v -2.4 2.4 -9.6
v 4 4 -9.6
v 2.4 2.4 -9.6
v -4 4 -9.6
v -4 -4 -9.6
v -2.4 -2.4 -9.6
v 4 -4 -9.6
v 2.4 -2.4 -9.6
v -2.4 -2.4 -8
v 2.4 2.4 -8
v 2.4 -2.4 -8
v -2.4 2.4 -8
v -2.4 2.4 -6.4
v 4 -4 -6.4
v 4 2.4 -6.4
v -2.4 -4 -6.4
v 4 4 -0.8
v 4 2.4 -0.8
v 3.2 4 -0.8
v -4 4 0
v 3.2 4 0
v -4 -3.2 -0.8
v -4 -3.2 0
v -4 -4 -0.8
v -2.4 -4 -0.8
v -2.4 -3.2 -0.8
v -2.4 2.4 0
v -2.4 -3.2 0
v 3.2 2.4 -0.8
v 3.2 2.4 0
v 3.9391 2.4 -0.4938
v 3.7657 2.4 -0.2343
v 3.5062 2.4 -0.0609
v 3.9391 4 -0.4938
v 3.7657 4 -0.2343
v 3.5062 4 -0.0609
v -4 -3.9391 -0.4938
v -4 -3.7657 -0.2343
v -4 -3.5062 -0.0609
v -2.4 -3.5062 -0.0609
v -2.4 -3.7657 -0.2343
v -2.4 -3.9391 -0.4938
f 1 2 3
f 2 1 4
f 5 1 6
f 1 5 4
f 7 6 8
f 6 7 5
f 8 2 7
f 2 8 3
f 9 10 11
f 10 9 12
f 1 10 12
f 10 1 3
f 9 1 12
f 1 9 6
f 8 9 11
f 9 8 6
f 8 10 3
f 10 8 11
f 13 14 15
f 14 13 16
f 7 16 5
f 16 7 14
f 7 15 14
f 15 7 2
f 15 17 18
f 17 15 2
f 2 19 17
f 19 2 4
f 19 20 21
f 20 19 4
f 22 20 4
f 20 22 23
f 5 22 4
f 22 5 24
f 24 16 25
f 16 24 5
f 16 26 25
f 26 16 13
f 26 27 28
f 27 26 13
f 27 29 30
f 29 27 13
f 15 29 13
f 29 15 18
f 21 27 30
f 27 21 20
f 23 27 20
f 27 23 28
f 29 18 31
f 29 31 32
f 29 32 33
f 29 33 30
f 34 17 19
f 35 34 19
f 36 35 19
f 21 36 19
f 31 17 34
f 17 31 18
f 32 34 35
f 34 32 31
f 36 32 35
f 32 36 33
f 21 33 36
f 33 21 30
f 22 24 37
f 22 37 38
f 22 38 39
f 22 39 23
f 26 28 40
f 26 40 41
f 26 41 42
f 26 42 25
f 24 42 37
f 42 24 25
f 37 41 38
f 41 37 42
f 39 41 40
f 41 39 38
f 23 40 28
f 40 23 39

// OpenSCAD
// file: ../p/1-4edge.scad
use <../lib.scad>
function ldraw_lib__1_4edge() = [
// 0 Circle 0.25
// 0 Name: 1-4edge.dat
// 0 Author: James Jessiman
// 0 !LDRAW_ORG Primitive UPDATE 2017-01
// 0 !LICENSE Licensed under CC BY 4.0 : see CAreadme.txt
// 
// 0 BFC CERTIFY CCW
  [0,"BFC","CERTIFY"],
  [0,"BFC","CCW"],
// 
// 0 !HISTORY 2007-06-22 [PTadmin] Header formatted for Contributor Agreement
// 0 !HISTORY 2008-07-01 [PTadmin] Official Update 2008-01
// 0 !HISTORY 2017-01-15 [Steffen] BFCed
// 0 !HISTORY 2017-12-30 [PTadmin] Official Update 2017-01
// 
// 
// 2 24 1 0 0 0.9239 0 0.3827
  [2,24,1,0,0,0.9239,0,0.3827],
// 2 24 0.9239 0 0.3827 0.7071 0 0.7071
  [2,24,0.9239,0,0.3827,0.7071,0,0.7071],
// 2 24 0.7071 0 0.7071 0.3827 0 0.9239
  [2,24,0.7071,0,0.7071,0.3827,0,0.9239],
// 2 24 0.3827 0 0.9239 0 0 1
  [2,24,0.3827,0,0.9239,0,0,1],
];
module ldraw_lib__1_4edge(step=0, col=false, unit=2/5, alt=false, line=0.2, solid=!$preview)
    makepoly(ldraw_lib__1_4edge(), step=step, col=col, unit=unit, alt=alt, line=line, solid=solid);
ldraw_lib__1_4edge(line=0.2);
// file: ../p/1-4cyli.scad
use <../lib.scad>
function ldraw_lib__1_4cyli() = [
// 0 Cylinder 0.25
// 0 Name: 1-4cyli.dat
// 0 Author: James Jessiman
// 0 !LDRAW_ORG Primitive UPDATE 2012-01
// 0 !LICENSE Licensed under CC BY 4.0 : see CAreadme.txt
// 
// 0 BFC CERTIFY CCW
  [0,"BFC","CERTIFY"],
  [0,"BFC","CCW"],
// 
// 0 !HISTORY 2002-03-23 [sbliss] Added BFC statement.
// 0 !HISTORY 2002-04-25 [PTadmin] Official Update 2002-02
// 0 !HISTORY 2007-06-22 [PTadmin] Header formatted for Contributor Agreement
// 0 !HISTORY 2008-07-01 [PTadmin] Official Update 2008-01
// 0 !HISTORY 2012-02-16 [Philo] Changed to CCW
// 0 !HISTORY 2012-03-30 [PTadmin] Official Update 2012-01
// 
// 
// 4 16 1 1 0 0.9239 1 0.3827 0.9239 0 0.3827 1 0 0
  [4,16,1,1,0,0.9239,1,0.3827,0.9239,0,0.3827,1,0,0],
// 5 24 1 0 0 1 1 0 0.9239 0 0.3827 1 0 -1
  [5,24,1,0,0,1,1,0,0.9239,0,0.3827,1,0,-1],
// 4 16 0.9239 1 0.3827 0.7071 1 0.7071 0.7071 0 0.7071 0.9239 0 0.3827
  [4,16,0.9239,1,0.3827,0.7071,1,0.7071,0.7071,0,0.7071,0.9239,0,0.3827],
// 5 24 0.9239 0 0.3827 0.9239 1 0.3827 0.7071 0 0.7071 1 0 0
  [5,24,0.9239,0,0.3827,0.9239,1,0.3827,0.7071,0,0.7071,1,0,0],
// 4 16 0.7071 1 0.7071 0.3827 1 0.9239 0.3827 0 0.9239 0.7071 0 0.7071
  [4,16,0.7071,1,0.7071,0.3827,1,0.9239,0.3827,0,0.9239,0.7071,0,0.7071],
// 5 24 0.7071 0 0.7071 0.7071 1 0.7071 0.3827 0 0.9239 0.9239 0 0.3827
  [5,24,0.7071,0,0.7071,0.7071,1,0.7071,0.3827,0,0.9239,0.9239,0,0.3827],
// 4 16 0.3827 1 0.9239 0 1 1 0 0 1 0.3827 0 0.9239
  [4,16,0.3827,1,0.9239,0,1,1,0,0,1,0.3827,0,0.9239],
// 5 24 0.3827 0 0.9239 0.3827 1 0.9239 0 0 1 0.7071 0 0.7071
  [5,24,0.3827,0,0.9239,0.3827,1,0.9239,0,0,1,0.7071,0,0.7071],
// 5 24 0 0 1 0 1 1 0.3827 0 0.9239 -1 0 1
  [5,24,0,0,1,0,1,1,0.3827,0,0.9239,-1,0,1],
];
module ldraw_lib__1_4cyli(step=0, col=false, unit=2/5, alt=false, line=0.2, solid=!$preview)
    makepoly(ldraw_lib__1_4cyli(), step=step, col=col, unit=unit, alt=alt, line=line, solid=solid);
ldraw_lib__1_4cyli(line=0.2);
// file: ../p/box5.scad
use <../lib.scad>
function ldraw_lib__box5() = [
// 0 Box with 5 Faces and All Edges
// 0 Name: box5.dat
// 0 Author: James Jessiman
// 0 !LDRAW_ORG Primitive UPDATE 2012-01
// 0 !LICENSE Licensed under CC BY 4.0 : see CAreadme.txt
// 
// 0 BFC CERTIFY CCW
  [0,"BFC","CERTIFY"],
  [0,"BFC","CCW"],
// 
// 0 !HISTORY 2002-04-03 [sbliss] Modified for BFC compliance
// 0 !HISTORY 2002-04-25 [PTadmin] Official Update 2002-02
// 0 !HISTORY 2007-06-24 [PTadmin] Header formatted for Contributor Agreement
// 0 !HISTORY 2008-07-01 [PTadmin] Official Update 2008-01
// 0 !HISTORY 2012-02-16 [Philo] Changed to CCW
// 0 !HISTORY 2012-03-30 [PTadmin] Official Update 2012-01
// 
// 
// 2 24 1 1 1 -1 1 1
  [2,24,1,1,1,-1,1,1],
// 2 24 -1 1 1 -1 1 -1
  [2,24,-1,1,1,-1,1,-1],
// 2 24 -1 1 -1 1 1 -1
  [2,24,-1,1,-1,1,1,-1],
// 2 24 1 1 -1 1 1 1
  [2,24,1,1,-1,1,1,1],
// 2 24 1 0 1 -1 0 1
  [2,24,1,0,1,-1,0,1],
// 2 24 -1 0 1 -1 0 -1
  [2,24,-1,0,1,-1,0,-1],
// 2 24 -1 0 -1 1 0 -1
  [2,24,-1,0,-1,1,0,-1],
// 2 24 1 0 -1 1 0 1
  [2,24,1,0,-1,1,0,1],
// 2 24 1 0 1 1 1 1
  [2,24,1,0,1,1,1,1],
// 2 24 -1 0 1 -1 1 1
  [2,24,-1,0,1,-1,1,1],
// 2 24 1 0 -1 1 1 -1
  [2,24,1,0,-1,1,1,-1],
// 2 24 -1 0 -1 -1 1 -1
  [2,24,-1,0,-1,-1,1,-1],
// 4 16 -1 1 1 1 1 1 1 1 -1 -1 1 -1
  [4,16,-1,1,1,1,1,1,1,1,-1,-1,1,-1],
// 4 16 -1 1 1 -1 0 1 1 0 1 1 1 1
  [4,16,-1,1,1,-1,0,1,1,0,1,1,1,1],
// 4 16 -1 1 -1 -1 0 -1 -1 0 1 -1 1 1
  [4,16,-1,1,-1,-1,0,-1,-1,0,1,-1,1,1],
// 4 16 1 1 -1 1 0 -1 -1 0 -1 -1 1 -1
  [4,16,1,1,-1,1,0,-1,-1,0,-1,-1,1,-1],
// 4 16 1 1 1 1 0 1 1 0 -1 1 1 -1
  [4,16,1,1,1,1,0,1,1,0,-1,1,1,-1],
];
module ldraw_lib__box5(step=0, col=false, unit=2/5, alt=false, line=0.2, solid=!$preview)
    makepoly(ldraw_lib__box5(), step=step, col=col, unit=unit, alt=alt, line=line, solid=solid);
ldraw_lib__box5(line=0.2);
// file: ../p/1-4disc.scad
use <../lib.scad>
function ldraw_lib__1_4disc() = [
// 0 Disc 0.25
// 0 Name: 1-4disc.dat
// 0 Author: James Jessiman
// 0 !LDRAW_ORG Primitive UPDATE 2002-02
// 0 !LICENSE Licensed under CC BY 4.0 : see CAreadme.txt
// 
// 0 BFC CERTIFY CCW
  [0,"BFC","CERTIFY"],
  [0,"BFC","CCW"],
// 
// 0 !HISTORY 2002-03-23 [sbliss] Added BFC statement.
// 0 !HISTORY 2002-04-25 [PTadmin] Official Update 2002-02
// 0 !HISTORY 2007-06-22 [PTadmin] Header formatted for Contributor Agreement
// 0 !HISTORY 2008-07-01 [PTadmin] Official Update 2008-01
// 
// 
// 3 16 0 0 0 1 0 0 0.9239 0 0.3827
  [3,16,0,0,0,1,0,0,0.9239,0,0.3827],
// 3 16 0 0 0 0.9239 0 0.3827 0.7071 0 0.7071
  [3,16,0,0,0,0.9239,0,0.3827,0.7071,0,0.7071],
// 3 16 0 0 0 0.7071 0 0.7071 0.3827 0 0.9239
  [3,16,0,0,0,0.7071,0,0.7071,0.3827,0,0.9239],
// 3 16 0 0 0 0.3827 0 0.9239 0 0 1
  [3,16,0,0,0,0.3827,0,0.9239,0,0,1],
// 0
];
module ldraw_lib__1_4disc(step=0, col=false, unit=2/5, alt=false, line=0.2, solid=!$preview)
    makepoly(ldraw_lib__1_4disc(), step=step, col=col, unit=unit, alt=alt, line=line, solid=solid);
ldraw_lib__1_4disc(line=0.2);
// file: ../p/1-4cylo.scad
use <../lib.scad>
use <1-4cyli.scad>
use <1-4edge.scad>
function ldraw_lib__1_4cylo() = [
// 0 Cylinder Open 0.25
// 0 Name: 1-4cylo.dat
// 0 Author: Max Martin Richter [MMR1988]
// 0 !LDRAW_ORG Primitive UPDATE 2010-03
// 0 !LICENSE Licensed under CC BY 4.0 : see CAreadme.txt
// 
// 0 BFC CERTIFY CCW
  [0,"BFC","CERTIFY"],
  [0,"BFC","CCW"],
// 
// 0 !HISTORY 2010-12-31 [PTadmin] Official Update 2010-03
// 
// 
// 1 16 0 0 0 1 0 0 0 1 0 0 0 1 1-4edge.dat
  [1,16,0,0,0,1,0,0,0,1,0,0,0,1, ldraw_lib__1_4edge()],
// 1 16 0 1 0 1 0 0 0 1 0 0 0 1 1-4edge.dat
  [1,16,0,1,0,1,0,0,0,1,0,0,0,1, ldraw_lib__1_4edge()],
// 1 16 0 0 0 1 0 0 0 1 0 0 0 1 1-4cyli.dat
  [1,16,0,0,0,1,0,0,0,1,0,0,0,1, ldraw_lib__1_4cyli()],
];
module ldraw_lib__1_4cylo(step=0, col=false, unit=2/5, alt=false, line=0.2, solid=!$preview)
    makepoly(ldraw_lib__1_4cylo(), step=step, col=col, unit=unit, alt=alt, line=line, solid=solid);
ldraw_lib__1_4cylo(line=0.2);
// main file
use <../lib.scad>
use <../p/1-4cylo.scad>
use <../p/1-4disc.scad>
use <../p/box5.scad>
function ldraw_lib__6231() = [
// 0 Panel  1 x  1 x  1 Corner with Rounded Corners
// 0 Name: 6231.dat
// 0 Author: James Jessiman
// 0 !LDRAW_ORG Part UPDATE 2025-09
// 0 !LICENSE Licensed under CC BY 4.0 : see CAreadme.txt
// 
// 0 BFC CERTIFY CCW
  [0,"BFC","CERTIFY"],
  [0,"BFC","CCW"],
// 
// 0 !HISTORY 2001-10-12 [sparre] bug-fix
// 0 !HISTORY 2001-11-30 [PTadmin] Official Update 2001-02
// 0 !HISTORY 2007-10-26 [PTadmin] Header formatted for Contributor Agreement
// 0 !HISTORY 2008-07-01 [PTadmin] Official Update 2008-01
// 0 !HISTORY 2008-07-07 [mikeheide] BFC'd (2007-08-24)
// 0 !HISTORY 2009-09-03 [PTadmin] Official Update 2009-02
// 0 !HISTORY 2011-01-24 [Rolf] Added rounded corners
// 0 !HISTORY 2011-12-29 [PTadmin] Official Update 2011-02
// 0 !HISTORY 2025-09-27 [OrionP] Changed winding to CCW
// 0 !HISTORY 2025-09-29 [OrionP] Official Update 2025-09
// 
// 2 24 10 24 10 -10 24 10
  [2,24,10,24,10,-10,24,10],
// 2 24 -10 24 10 -10 24 -10
  [2,24,-10,24,10,-10,24,-10],
// 2 24 -10 24 -10 10 24 -10
  [2,24,-10,24,-10,10,24,-10],
// 2 24 10 24 -10 10 24 10
  [2,24,10,24,-10,10,24,10],
// 2 24 10 16 6 -6 16 6
  [2,24,10,16,6,-6,16,6],
// 2 24 -6 16 6 -6 16 -10
  [2,24,-6,16,6,-6,16,-10],
// 2 24 -6 16 -10 10 16 -10
  [2,24,-6,16,-10,10,16,-10],
// 2 24 10 16 -10 10 16 6
  [2,24,10,16,-10,10,16,6],
// 2 24 8 0 10 -10 0 10
  [2,24,8,0,10,-10,0,10],
// 2 24 -10 0 10 -10 0 -8
  [2,24,-10,0,10,-10,0,-8],
// 2 24 -6 0 -8 -6 0 6
  [2,24,-6,0,-8,-6,0,6],
// 2 24 -6 0 6 8 0 6
  [2,24,-6,0,6,8,0,6],
// 2 24 10 2 6 10 16 6
  [2,24,10,2,6,10,16,6],
// 2 24 -6 0 6 -6 16 6
  [2,24,-6,0,6,-6,16,6],
// 2 24 -6 2 -10 -6 16 -10
  [2,24,-6,2,-10,-6,16,-10],
// 2 24 10 16 -10 10 24 -10
  [2,24,10,16,-10,10,24,-10],
// 2 24 10 2 10 10 24 10
  [2,24,10,2,10,10,24,10],
// 2 24 -10 0 10 -10 24 10
  [2,24,-10,0,10,-10,24,10],
// 2 24 -10 2 -10 -10 24 -10
  [2,24,-10,2,-10,-10,24,-10],
// 
// 4 16 10 24 10 6 24 6 -6 24 6 -10 24 10
  [4,16,10,24,10,6,24,6,-6,24,6,-10,24,10],
// 4 16 -10 24 10 -6 24 6 -6 24 -6 -10 24 -10
  [4,16,-10,24,10,-6,24,6,-6,24,-6,-10,24,-10],
// 4 16 -10 24 -10 -6 24 -6 6 24 -6 10 24 -10
  [4,16,-10,24,-10,-6,24,-6,6,24,-6,10,24,-10],
// 4 16 10 24 -10 6 24 -6 6 24 6 10 24 10
  [4,16,10,24,-10,6,24,-6,6,24,6,10,24,10],
// 0 BFC INVERTNEXT
  [0,"BFC","INVERTNEXT"],
// 1 16 0 24 0 6 0 0 0 -4 0 0 0 6 box5.dat
  [1,16,0,24,0,6,0,0,0,-4,0,0,0,6, ldraw_lib__box5()],
// 4 16 -6 16 6 -6 16 -10 10 16 -10 10 16 6
  [4,16,-6,16,6,-6,16,-10,10,16,-10,10,16,6],
// 4 16 -10 24 -10 10 24 -10 10 16 -10 -6 16 -10
  [4,16,-10,24,-10,10,24,-10,10,16,-10,-6,16,-10],
// 4 16 10 24 -10 10 24 10 10 16 6 10 16 -10
  [4,16,10,24,-10,10,24,10,10,16,6,10,16,-10],
// 4 16 10 2 6 10 16 6 10 24 10 10 2 10
  [4,16,10,2,6,10,16,6,10,24,10,10,2,10],
// 4 16 -10 24 10 8 2 10 10 2 10 10 24 10
  [4,16,-10,24,10,8,2,10,10,2,10,10,24,10],
// 4 16 -10 24 10 -10 0 10 8 0 10 8 2 10
  [4,16,-10,24,10,-10,0,10,8,0,10,8,2,10],
// 4 16 -10 2 -8 -10 0 -8 -10 0 10 -10 24 10
  [4,16,-10,2,-8,-10,0,-8,-10,0,10,-10,24,10],
// 4 16 -10 24 -10 -10 2 -10 -10 2 -8 -10 24 10
  [4,16,-10,24,-10,-10,2,-10,-10,2,-8,-10,24,10],
// 4 16 -6 16 -10 -6 2 -10 -10 2 -10 -10 24 -10
  [4,16,-6,16,-10,-6,2,-10,-10,2,-10,-10,24,-10],
// 4 16 -6 16 6 -6 2 -8 -6 2 -10 -6 16 -10
  [4,16,-6,16,6,-6,2,-8,-6,2,-10,-6,16,-10],
// 4 16 -6 16 6 -6 0 6 -6 0 -8 -6 2 -8
  [4,16,-6,16,6,-6,0,6,-6,0,-8,-6,2,-8],
// 4 16 8 2 6 8 0 6 -6 0 6 -6 16 6
  [4,16,8,2,6,8,0,6,-6,0,6,-6,16,6],
// 4 16 10 16 6 10 2 6 8 2 6 -6 16 6
  [4,16,10,16,6,10,2,6,8,2,6,-6,16,6],
// 4 16 -10 0 10 -6 0 6 8 0 6 8 0 10
  [4,16,-10,0,10,-6,0,6,8,0,6,8,0,10],
// 4 16 -10 0 10 -10 0 -8 -6 0 -8 -6 0 6
  [4,16,-10,0,10,-10,0,-8,-6,0,-8,-6,0,6],
// 
// 1 16 8 2 6 2 0 0 0 0 -2 0 2 0 1-4disc.dat
  [1,16,8,2,6,2,0,0,0,0,-2,0,2,0, ldraw_lib__1_4disc()],
// 1 16 8 2 10 2 0 0 0 0 -2 0 -2 0 1-4disc.dat
  [1,16,8,2,10,2,0,0,0,0,-2,0,-2,0, ldraw_lib__1_4disc()],
// 1 16 8 2 6 2 0 0 0 0 -2 0 4 0 1-4cylo.dat
  [1,16,8,2,6,2,0,0,0,0,-2,0,4,0, ldraw_lib__1_4cylo()],
// 1 16 -10 2 -8 0 2 0 0 0 -2 -2 0 0 1-4disc.dat
  [1,16,-10,2,-8,0,2,0,0,0,-2,-2,0,0, ldraw_lib__1_4disc()],
// 1 16 -6 2 -8 0 -2 0 -2 0 0 0 0 -2 1-4disc.dat
  [1,16,-6,2,-8,0,-2,0,-2,0,0,0,0,-2, ldraw_lib__1_4disc()],
// 1 16 -10 2 -8 0 4 0 0 0 -2 -2 0 0 1-4cylo.dat
  [1,16,-10,2,-8,0,4,0,0,0,-2,-2,0,0, ldraw_lib__1_4cylo()],
// 0 //
];
module ldraw_lib__6231(step=0, col=false, unit=2/5, alt=false, line=0.2, solid=!$preview)
    makepoly(ldraw_lib__6231(), step=step, col=col, unit=unit, alt=alt, line=line, solid=solid);
ldraw_lib__6231(line=0.2);
